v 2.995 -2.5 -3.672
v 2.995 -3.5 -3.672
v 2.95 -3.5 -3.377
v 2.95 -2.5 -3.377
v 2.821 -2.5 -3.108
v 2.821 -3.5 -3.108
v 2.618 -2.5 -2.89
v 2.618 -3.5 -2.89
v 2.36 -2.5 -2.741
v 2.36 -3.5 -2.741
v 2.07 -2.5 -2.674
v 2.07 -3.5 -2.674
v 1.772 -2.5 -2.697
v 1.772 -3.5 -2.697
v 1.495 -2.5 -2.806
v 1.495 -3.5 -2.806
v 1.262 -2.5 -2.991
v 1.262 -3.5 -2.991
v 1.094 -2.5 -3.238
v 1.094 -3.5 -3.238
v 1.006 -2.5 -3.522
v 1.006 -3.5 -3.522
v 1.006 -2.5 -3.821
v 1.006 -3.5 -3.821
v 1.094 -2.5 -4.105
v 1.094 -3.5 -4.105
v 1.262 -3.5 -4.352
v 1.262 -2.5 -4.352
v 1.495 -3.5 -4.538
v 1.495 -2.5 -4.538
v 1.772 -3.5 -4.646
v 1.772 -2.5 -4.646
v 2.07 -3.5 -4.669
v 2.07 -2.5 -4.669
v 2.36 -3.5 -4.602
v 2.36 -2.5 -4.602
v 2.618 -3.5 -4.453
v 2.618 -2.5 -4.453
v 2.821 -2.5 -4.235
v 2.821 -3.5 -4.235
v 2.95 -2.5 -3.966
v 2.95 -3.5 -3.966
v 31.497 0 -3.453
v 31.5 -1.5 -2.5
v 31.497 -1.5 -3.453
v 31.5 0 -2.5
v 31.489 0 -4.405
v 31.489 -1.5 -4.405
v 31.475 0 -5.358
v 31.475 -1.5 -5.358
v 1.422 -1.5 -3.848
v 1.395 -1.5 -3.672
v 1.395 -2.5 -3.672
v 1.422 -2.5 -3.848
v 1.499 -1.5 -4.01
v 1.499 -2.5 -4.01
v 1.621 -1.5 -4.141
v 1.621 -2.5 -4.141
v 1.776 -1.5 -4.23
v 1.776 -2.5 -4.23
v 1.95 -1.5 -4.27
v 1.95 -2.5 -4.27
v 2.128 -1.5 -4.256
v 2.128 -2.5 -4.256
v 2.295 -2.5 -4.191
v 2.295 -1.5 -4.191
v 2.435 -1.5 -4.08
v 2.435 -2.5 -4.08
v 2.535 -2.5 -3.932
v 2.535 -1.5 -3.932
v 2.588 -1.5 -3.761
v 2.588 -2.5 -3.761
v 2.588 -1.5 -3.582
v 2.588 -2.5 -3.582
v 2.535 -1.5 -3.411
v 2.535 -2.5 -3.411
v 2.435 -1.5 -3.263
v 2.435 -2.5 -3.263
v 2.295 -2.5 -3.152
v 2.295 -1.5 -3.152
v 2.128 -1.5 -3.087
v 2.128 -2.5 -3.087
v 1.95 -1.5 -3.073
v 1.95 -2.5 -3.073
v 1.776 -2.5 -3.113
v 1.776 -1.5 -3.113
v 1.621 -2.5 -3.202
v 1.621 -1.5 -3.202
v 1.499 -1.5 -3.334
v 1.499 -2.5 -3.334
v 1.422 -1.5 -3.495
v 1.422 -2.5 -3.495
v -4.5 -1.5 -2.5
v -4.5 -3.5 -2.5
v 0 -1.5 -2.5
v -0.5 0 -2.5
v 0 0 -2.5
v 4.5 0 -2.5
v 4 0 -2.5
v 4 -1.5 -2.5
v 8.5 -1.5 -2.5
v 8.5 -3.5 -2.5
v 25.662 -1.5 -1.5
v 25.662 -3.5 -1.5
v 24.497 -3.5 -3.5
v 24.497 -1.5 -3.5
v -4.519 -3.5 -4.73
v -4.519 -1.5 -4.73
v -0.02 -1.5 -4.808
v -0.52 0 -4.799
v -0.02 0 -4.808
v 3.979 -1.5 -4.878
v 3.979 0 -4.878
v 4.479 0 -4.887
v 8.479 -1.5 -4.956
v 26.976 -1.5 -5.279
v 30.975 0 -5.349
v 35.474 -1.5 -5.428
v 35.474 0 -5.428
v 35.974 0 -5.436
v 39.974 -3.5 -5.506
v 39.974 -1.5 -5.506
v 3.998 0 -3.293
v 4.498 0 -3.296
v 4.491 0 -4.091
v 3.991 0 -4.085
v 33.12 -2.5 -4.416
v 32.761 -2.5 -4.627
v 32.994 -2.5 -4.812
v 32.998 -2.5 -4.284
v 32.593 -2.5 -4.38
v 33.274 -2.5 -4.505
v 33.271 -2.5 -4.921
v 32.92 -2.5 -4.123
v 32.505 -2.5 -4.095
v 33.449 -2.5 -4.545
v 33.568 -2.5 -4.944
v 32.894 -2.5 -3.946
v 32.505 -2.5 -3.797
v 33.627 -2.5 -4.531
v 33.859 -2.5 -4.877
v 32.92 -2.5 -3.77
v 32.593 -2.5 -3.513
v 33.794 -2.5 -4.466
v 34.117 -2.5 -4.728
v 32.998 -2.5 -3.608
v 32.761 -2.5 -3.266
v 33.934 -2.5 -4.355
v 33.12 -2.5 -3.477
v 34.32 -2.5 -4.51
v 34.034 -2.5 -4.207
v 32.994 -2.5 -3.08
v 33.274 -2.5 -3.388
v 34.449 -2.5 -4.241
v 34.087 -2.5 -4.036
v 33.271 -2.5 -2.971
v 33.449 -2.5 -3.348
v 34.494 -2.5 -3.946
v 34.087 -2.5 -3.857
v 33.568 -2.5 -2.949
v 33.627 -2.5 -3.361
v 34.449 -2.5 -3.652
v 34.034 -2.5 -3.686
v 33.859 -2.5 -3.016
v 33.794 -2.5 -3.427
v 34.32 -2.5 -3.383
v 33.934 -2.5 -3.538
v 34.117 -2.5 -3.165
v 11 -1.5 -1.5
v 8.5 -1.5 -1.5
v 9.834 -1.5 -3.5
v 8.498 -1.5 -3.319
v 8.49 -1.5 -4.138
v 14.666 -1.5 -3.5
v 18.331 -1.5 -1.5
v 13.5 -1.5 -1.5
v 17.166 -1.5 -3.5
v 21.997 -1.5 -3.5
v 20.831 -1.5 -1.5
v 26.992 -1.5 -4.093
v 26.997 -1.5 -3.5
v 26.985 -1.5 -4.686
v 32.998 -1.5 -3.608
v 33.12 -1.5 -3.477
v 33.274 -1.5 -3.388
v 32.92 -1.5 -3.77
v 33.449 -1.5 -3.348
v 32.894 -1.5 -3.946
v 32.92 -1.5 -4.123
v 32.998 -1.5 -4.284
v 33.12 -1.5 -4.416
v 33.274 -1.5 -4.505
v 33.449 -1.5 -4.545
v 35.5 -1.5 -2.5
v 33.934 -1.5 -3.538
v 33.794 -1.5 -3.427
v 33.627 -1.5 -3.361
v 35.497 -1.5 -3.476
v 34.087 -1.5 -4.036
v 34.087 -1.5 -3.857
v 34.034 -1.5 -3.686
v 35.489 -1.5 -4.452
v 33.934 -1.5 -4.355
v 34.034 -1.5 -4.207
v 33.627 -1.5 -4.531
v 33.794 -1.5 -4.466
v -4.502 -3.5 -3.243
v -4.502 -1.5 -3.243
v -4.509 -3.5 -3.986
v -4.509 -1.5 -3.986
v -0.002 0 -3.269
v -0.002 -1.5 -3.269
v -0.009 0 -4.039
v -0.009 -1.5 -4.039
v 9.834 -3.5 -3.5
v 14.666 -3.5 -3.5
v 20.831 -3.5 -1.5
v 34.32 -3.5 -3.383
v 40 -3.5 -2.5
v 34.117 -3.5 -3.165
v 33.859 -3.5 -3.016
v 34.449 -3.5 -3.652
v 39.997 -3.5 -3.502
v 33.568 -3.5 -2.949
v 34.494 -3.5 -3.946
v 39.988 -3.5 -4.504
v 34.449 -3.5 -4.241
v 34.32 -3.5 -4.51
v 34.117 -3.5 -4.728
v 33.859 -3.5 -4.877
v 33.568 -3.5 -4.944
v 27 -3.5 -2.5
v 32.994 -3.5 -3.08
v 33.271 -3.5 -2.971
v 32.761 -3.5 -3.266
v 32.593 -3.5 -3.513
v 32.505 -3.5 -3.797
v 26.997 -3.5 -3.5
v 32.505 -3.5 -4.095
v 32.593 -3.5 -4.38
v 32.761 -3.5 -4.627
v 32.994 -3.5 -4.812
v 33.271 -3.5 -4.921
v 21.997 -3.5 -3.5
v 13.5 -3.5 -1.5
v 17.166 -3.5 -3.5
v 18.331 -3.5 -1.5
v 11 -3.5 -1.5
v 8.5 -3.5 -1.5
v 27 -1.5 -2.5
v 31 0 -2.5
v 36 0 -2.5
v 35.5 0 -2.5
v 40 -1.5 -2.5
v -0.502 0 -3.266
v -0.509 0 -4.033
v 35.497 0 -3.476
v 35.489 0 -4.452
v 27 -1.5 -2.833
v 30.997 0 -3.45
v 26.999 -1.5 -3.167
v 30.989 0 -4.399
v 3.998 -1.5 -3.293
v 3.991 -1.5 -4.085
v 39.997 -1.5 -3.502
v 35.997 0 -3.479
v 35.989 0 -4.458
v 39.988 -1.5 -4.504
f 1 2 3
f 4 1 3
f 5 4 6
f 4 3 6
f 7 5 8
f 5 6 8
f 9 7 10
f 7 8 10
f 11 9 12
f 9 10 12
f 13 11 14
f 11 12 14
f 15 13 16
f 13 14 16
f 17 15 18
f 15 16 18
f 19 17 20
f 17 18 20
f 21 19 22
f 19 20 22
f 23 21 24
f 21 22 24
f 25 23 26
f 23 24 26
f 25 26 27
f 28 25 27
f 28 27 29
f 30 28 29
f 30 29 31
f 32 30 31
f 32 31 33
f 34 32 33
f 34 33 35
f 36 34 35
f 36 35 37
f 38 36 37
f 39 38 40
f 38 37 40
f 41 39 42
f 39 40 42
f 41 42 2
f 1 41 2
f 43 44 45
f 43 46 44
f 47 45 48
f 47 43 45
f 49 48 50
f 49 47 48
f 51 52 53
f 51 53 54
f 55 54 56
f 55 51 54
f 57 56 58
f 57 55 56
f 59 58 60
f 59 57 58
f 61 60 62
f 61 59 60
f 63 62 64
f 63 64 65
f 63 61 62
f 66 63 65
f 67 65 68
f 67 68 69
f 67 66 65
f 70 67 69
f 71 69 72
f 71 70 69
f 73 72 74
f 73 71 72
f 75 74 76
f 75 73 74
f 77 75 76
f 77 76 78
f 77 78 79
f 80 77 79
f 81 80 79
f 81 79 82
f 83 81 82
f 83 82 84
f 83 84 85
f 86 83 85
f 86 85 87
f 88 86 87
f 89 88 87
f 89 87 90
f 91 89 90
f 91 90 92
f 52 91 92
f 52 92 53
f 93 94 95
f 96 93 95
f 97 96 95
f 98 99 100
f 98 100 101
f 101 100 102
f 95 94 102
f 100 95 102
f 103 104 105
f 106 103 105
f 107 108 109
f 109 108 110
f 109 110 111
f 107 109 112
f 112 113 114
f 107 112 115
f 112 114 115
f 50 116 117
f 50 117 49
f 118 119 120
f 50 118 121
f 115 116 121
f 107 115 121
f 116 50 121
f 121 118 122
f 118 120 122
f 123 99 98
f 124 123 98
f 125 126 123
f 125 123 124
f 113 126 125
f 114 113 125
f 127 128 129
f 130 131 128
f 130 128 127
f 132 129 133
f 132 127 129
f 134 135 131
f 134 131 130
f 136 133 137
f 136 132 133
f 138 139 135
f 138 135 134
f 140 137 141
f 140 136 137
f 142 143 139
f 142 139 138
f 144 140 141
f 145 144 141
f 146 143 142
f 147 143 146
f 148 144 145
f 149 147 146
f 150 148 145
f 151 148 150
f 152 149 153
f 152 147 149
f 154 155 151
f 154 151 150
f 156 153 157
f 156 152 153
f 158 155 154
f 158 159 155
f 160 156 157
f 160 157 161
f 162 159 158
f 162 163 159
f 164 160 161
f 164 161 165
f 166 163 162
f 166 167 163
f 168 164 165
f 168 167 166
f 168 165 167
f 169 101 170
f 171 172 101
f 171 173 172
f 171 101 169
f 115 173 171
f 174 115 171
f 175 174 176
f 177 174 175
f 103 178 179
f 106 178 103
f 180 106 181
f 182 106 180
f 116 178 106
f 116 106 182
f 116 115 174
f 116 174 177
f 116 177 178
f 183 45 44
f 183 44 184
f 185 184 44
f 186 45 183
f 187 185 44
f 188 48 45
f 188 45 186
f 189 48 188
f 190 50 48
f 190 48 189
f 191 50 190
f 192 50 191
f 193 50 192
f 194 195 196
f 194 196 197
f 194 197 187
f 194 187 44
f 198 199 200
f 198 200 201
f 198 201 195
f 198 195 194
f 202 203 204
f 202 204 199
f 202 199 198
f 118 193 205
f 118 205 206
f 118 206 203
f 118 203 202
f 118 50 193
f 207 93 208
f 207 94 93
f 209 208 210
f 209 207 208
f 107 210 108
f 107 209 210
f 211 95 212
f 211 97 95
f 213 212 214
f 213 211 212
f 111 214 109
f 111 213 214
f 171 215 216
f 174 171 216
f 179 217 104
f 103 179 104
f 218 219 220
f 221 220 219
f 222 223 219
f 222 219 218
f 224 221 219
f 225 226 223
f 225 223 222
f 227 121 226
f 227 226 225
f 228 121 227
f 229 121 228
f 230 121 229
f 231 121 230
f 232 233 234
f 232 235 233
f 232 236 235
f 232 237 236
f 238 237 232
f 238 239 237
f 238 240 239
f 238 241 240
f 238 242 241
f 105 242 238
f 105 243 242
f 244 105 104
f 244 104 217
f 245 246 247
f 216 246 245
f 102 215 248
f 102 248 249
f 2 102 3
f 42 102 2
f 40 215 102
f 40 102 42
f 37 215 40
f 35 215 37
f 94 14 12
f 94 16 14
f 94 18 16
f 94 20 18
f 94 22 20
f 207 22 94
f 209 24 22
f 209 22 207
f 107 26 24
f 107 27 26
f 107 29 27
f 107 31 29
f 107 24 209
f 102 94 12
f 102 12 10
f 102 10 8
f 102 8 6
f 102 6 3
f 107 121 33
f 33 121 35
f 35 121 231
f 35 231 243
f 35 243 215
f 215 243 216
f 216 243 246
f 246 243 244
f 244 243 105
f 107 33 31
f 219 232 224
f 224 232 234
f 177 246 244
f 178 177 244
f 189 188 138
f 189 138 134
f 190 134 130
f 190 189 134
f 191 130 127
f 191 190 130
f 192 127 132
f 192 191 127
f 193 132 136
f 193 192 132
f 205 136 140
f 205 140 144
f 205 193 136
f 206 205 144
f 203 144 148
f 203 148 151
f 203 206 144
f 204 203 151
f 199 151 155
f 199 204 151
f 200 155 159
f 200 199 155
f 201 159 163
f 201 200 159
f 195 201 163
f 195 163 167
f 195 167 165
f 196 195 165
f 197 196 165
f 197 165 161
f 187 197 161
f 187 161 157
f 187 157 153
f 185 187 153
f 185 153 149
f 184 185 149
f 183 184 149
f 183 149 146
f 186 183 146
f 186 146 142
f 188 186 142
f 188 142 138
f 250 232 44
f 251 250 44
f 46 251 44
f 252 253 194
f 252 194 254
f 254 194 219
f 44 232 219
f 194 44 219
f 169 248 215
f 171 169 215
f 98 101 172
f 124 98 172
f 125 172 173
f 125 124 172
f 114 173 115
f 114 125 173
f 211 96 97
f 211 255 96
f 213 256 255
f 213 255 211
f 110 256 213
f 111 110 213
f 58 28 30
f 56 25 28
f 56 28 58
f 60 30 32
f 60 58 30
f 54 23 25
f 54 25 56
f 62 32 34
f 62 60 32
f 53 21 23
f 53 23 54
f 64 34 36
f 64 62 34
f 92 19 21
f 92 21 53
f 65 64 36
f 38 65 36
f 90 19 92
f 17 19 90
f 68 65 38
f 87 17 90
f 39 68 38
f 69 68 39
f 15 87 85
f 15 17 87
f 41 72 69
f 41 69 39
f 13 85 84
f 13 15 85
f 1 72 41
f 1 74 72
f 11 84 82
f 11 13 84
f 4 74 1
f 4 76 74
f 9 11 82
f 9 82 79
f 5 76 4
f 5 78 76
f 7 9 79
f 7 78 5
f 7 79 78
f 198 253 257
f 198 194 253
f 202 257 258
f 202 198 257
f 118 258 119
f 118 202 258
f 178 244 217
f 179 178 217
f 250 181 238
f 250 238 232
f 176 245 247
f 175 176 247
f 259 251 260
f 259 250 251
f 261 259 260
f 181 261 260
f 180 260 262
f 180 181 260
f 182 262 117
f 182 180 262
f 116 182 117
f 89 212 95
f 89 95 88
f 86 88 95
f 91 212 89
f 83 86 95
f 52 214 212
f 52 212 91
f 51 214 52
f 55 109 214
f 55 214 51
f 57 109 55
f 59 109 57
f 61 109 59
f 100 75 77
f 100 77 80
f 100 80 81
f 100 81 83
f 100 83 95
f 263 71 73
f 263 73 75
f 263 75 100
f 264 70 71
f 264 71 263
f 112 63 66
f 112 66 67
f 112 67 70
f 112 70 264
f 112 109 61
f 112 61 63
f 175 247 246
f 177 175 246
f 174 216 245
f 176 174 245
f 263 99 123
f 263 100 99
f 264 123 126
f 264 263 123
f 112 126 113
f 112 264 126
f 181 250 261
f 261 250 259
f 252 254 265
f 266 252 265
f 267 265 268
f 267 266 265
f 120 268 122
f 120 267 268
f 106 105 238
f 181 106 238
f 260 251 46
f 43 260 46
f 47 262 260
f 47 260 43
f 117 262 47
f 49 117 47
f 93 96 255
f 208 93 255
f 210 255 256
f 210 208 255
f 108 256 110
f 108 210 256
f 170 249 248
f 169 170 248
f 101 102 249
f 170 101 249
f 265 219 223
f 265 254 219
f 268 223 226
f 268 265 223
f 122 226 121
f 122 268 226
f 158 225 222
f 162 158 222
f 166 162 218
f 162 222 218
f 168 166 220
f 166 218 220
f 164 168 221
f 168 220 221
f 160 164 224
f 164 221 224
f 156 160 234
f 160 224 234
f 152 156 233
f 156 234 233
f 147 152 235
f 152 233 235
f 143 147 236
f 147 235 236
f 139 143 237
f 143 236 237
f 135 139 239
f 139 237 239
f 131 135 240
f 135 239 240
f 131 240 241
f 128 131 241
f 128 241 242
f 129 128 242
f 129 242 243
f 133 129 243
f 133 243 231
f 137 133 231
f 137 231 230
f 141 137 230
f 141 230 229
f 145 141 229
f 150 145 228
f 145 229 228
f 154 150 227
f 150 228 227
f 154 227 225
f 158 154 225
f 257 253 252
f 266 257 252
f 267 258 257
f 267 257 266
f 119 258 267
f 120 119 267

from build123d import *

# Parameters (mm, degrees)
EXTRUDE_1_DEPTH          = 2.5
SKETCH_5_R               = 0.6
CUT_EXTRUDE_1_DEPTH      = 19.036421485
CUT_EXTRUDE_START        = -2
SKETCH_5_3_R             = 1
CUT_EXTRUDE_2_DEPTH      = 1
REVOLVE_1_ANGLE          = 1
SKETCH_9_R               = 0.6
CUT_EXTRUDE_3_DEPTH      = 41.426698916
SKETCH_9_3_R             = 1
CUT_EXTRUDE_4_DEPTH      = 1
SKETCH_10_W              = 73.33326834
SKETCH_10_H              = 28.500223869
CUT_EXTRUDE_5_DEPTH      = 41.528606999
CUT_EXTRUDE_8_DEPTH      = 41.426698916
CUT_EXTRUDE_8_DEPTH_BACK = 41.426698916


with BuildPart() as part:
    # 草图4 → 凸台-拉伸1 (new body)
    with BuildSketch(Plane.XY):
        Polygon((8.5, -1.5), (17.75, -1.5), (17.75, -3.5), (-4.5, -3.5), (-4.5, -1.5), (-0.5, 0), (0, 0), (0, -1.5), (4, -1.5), (4, 0), (4.5, 0), align=None)
    extrude(amount=EXTRUDE_1_DEPTH)

    # 草图5 → 切除-拉伸1 (cut, through all)
    with BuildSketch(Plane(origin=(0, -1.5, 0), x_dir=(1, 0, 0), z_dir=(0, 1, 0))):
        with Locations(Location((2, -1.25, 0), (0, 0, 270))):
            Circle(SKETCH_5_R)
    extrude(amount=-CUT_EXTRUDE_1_DEPTH, mode=Mode.SUBTRACT)

    # 草图5<3> → 切除-拉伸2 (cut)
    with BuildSketch(Plane(origin=(0, -1.5, 0), x_dir=(1, 0, 0), z_dir=(0, 1, 0)).offset(CUT_EXTRUDE_START)):
        with Locations((2, -1.25)):
            Circle(SKETCH_5_3_R)
    extrude(amount=CUT_EXTRUDE_2_DEPTH, mode=Mode.SUBTRACT)

    # 镜向1: part across plane


with BuildPart() as part_1:
    add(part.part)
    add(part.part.mirror(Plane(origin=(17.75, 0, 2.5), x_dir=(0, 0, 1), z_dir=(1, 0, 0))))

    # 草图6 → 旋转1 (revolve)
    with BuildSketch(Plane.XY.offset(2.5)):
        Polygon((0, 0), (-0.5, 0), (-4.5, -1.5), (-4.5, -3.5), (40, -3.5), (40, -1.5), (36, 0), (35.5, 0), (35.5, -1.5), (31.5, -1.5), (31.5, 0), (31, 0), (27, -1.5), (8.5, -1.5), (4.5, 0), (4, 0), (4, -1.5), (0, -1.5), align=None)
    revolve(axis=Axis((-132.25, 94.8535776, 2.5), (0, -1, 0)), revolution_arc=REVOLVE_1_ANGLE)

    # 草图9 → 切除-拉伸3 (cut, through all)
    with BuildSketch(Plane(origin=(0, -1.5, 0), x_dir=(1, 0, 0), z_dir=(0, 1, 0))):
        with Locations(Location((1.994888171, -3.671537391, 0), (0, 0, 180))):
            Circle(SKETCH_9_R)
        with Locations(Location((33.493688748, -3.946423259, 0), (0, 0, 180))):
            Circle(SKETCH_9_R)
    extrude(amount=-CUT_EXTRUDE_3_DEPTH, mode=Mode.SUBTRACT)

    # 草图9<3> → 切除-拉伸4 (cut)
    with BuildSketch(Plane(origin=(0, -1.5, 0), x_dir=(1, 0, 0), z_dir=(0, 1, 0)).offset(CUT_EXTRUDE_START)):
        with Locations((1.994888171, -3.671537391)):
            Circle(SKETCH_9_3_R)
        with Locations((33.493688748, -3.946423259)):
            Circle(SKETCH_9_3_R)
    extrude(amount=CUT_EXTRUDE_4_DEPTH, mode=Mode.SUBTRACT)

    # 镜向2: part across plane


with BuildPart() as part_2:
    add(part_1.part)
    add(part_1.part.mirror(Plane.XY))

    # 草图10 → 切除-拉伸5 (cut, through all)
    with BuildSketch(Plane(origin=(0, 0, 0), x_dir=(-1, 0, 0), z_dir=(0, 0, -1))):
        with Locations((-19.859748979, -4.462825858)):
            Rectangle(SKETCH_10_W, SKETCH_10_H)
    extrude(amount=-CUT_EXTRUDE_5_DEPTH, mode=Mode.SUBTRACT)

    # 草图11 → 切除-拉伸8 (cut, two sides: drawn at the far end of the back side and taken through both)
    with BuildSketch(Plane(origin=(0, -1.5, 0), x_dir=(1, 0, 0), z_dir=(0, 1, 0)).offset(-CUT_EXTRUDE_8_DEPTH_BACK)):
        Polygon((8.5, 2.5), (8.5, 1.5), (11, 1.5), (9.834379916, 3.5), (14.665620084, 3.5), (13.5, 1.5), (18.331240168, 1.5), (17.165620084, 3.5), (21.996860252, 3.5), (20.831240168, 1.5), (25.662480335, 1.5), (24.496860252, 3.5), (26.996860252, 3.5), (27, 2.5), (40, 2.5), (40, 0), (-4.5, 0), (-4.5, 2.5), align=None)
    extrude(amount=CUT_EXTRUDE_8_DEPTH + CUT_EXTRUDE_8_DEPTH_BACK, mode=Mode.SUBTRACT)


solid = part_2.part
